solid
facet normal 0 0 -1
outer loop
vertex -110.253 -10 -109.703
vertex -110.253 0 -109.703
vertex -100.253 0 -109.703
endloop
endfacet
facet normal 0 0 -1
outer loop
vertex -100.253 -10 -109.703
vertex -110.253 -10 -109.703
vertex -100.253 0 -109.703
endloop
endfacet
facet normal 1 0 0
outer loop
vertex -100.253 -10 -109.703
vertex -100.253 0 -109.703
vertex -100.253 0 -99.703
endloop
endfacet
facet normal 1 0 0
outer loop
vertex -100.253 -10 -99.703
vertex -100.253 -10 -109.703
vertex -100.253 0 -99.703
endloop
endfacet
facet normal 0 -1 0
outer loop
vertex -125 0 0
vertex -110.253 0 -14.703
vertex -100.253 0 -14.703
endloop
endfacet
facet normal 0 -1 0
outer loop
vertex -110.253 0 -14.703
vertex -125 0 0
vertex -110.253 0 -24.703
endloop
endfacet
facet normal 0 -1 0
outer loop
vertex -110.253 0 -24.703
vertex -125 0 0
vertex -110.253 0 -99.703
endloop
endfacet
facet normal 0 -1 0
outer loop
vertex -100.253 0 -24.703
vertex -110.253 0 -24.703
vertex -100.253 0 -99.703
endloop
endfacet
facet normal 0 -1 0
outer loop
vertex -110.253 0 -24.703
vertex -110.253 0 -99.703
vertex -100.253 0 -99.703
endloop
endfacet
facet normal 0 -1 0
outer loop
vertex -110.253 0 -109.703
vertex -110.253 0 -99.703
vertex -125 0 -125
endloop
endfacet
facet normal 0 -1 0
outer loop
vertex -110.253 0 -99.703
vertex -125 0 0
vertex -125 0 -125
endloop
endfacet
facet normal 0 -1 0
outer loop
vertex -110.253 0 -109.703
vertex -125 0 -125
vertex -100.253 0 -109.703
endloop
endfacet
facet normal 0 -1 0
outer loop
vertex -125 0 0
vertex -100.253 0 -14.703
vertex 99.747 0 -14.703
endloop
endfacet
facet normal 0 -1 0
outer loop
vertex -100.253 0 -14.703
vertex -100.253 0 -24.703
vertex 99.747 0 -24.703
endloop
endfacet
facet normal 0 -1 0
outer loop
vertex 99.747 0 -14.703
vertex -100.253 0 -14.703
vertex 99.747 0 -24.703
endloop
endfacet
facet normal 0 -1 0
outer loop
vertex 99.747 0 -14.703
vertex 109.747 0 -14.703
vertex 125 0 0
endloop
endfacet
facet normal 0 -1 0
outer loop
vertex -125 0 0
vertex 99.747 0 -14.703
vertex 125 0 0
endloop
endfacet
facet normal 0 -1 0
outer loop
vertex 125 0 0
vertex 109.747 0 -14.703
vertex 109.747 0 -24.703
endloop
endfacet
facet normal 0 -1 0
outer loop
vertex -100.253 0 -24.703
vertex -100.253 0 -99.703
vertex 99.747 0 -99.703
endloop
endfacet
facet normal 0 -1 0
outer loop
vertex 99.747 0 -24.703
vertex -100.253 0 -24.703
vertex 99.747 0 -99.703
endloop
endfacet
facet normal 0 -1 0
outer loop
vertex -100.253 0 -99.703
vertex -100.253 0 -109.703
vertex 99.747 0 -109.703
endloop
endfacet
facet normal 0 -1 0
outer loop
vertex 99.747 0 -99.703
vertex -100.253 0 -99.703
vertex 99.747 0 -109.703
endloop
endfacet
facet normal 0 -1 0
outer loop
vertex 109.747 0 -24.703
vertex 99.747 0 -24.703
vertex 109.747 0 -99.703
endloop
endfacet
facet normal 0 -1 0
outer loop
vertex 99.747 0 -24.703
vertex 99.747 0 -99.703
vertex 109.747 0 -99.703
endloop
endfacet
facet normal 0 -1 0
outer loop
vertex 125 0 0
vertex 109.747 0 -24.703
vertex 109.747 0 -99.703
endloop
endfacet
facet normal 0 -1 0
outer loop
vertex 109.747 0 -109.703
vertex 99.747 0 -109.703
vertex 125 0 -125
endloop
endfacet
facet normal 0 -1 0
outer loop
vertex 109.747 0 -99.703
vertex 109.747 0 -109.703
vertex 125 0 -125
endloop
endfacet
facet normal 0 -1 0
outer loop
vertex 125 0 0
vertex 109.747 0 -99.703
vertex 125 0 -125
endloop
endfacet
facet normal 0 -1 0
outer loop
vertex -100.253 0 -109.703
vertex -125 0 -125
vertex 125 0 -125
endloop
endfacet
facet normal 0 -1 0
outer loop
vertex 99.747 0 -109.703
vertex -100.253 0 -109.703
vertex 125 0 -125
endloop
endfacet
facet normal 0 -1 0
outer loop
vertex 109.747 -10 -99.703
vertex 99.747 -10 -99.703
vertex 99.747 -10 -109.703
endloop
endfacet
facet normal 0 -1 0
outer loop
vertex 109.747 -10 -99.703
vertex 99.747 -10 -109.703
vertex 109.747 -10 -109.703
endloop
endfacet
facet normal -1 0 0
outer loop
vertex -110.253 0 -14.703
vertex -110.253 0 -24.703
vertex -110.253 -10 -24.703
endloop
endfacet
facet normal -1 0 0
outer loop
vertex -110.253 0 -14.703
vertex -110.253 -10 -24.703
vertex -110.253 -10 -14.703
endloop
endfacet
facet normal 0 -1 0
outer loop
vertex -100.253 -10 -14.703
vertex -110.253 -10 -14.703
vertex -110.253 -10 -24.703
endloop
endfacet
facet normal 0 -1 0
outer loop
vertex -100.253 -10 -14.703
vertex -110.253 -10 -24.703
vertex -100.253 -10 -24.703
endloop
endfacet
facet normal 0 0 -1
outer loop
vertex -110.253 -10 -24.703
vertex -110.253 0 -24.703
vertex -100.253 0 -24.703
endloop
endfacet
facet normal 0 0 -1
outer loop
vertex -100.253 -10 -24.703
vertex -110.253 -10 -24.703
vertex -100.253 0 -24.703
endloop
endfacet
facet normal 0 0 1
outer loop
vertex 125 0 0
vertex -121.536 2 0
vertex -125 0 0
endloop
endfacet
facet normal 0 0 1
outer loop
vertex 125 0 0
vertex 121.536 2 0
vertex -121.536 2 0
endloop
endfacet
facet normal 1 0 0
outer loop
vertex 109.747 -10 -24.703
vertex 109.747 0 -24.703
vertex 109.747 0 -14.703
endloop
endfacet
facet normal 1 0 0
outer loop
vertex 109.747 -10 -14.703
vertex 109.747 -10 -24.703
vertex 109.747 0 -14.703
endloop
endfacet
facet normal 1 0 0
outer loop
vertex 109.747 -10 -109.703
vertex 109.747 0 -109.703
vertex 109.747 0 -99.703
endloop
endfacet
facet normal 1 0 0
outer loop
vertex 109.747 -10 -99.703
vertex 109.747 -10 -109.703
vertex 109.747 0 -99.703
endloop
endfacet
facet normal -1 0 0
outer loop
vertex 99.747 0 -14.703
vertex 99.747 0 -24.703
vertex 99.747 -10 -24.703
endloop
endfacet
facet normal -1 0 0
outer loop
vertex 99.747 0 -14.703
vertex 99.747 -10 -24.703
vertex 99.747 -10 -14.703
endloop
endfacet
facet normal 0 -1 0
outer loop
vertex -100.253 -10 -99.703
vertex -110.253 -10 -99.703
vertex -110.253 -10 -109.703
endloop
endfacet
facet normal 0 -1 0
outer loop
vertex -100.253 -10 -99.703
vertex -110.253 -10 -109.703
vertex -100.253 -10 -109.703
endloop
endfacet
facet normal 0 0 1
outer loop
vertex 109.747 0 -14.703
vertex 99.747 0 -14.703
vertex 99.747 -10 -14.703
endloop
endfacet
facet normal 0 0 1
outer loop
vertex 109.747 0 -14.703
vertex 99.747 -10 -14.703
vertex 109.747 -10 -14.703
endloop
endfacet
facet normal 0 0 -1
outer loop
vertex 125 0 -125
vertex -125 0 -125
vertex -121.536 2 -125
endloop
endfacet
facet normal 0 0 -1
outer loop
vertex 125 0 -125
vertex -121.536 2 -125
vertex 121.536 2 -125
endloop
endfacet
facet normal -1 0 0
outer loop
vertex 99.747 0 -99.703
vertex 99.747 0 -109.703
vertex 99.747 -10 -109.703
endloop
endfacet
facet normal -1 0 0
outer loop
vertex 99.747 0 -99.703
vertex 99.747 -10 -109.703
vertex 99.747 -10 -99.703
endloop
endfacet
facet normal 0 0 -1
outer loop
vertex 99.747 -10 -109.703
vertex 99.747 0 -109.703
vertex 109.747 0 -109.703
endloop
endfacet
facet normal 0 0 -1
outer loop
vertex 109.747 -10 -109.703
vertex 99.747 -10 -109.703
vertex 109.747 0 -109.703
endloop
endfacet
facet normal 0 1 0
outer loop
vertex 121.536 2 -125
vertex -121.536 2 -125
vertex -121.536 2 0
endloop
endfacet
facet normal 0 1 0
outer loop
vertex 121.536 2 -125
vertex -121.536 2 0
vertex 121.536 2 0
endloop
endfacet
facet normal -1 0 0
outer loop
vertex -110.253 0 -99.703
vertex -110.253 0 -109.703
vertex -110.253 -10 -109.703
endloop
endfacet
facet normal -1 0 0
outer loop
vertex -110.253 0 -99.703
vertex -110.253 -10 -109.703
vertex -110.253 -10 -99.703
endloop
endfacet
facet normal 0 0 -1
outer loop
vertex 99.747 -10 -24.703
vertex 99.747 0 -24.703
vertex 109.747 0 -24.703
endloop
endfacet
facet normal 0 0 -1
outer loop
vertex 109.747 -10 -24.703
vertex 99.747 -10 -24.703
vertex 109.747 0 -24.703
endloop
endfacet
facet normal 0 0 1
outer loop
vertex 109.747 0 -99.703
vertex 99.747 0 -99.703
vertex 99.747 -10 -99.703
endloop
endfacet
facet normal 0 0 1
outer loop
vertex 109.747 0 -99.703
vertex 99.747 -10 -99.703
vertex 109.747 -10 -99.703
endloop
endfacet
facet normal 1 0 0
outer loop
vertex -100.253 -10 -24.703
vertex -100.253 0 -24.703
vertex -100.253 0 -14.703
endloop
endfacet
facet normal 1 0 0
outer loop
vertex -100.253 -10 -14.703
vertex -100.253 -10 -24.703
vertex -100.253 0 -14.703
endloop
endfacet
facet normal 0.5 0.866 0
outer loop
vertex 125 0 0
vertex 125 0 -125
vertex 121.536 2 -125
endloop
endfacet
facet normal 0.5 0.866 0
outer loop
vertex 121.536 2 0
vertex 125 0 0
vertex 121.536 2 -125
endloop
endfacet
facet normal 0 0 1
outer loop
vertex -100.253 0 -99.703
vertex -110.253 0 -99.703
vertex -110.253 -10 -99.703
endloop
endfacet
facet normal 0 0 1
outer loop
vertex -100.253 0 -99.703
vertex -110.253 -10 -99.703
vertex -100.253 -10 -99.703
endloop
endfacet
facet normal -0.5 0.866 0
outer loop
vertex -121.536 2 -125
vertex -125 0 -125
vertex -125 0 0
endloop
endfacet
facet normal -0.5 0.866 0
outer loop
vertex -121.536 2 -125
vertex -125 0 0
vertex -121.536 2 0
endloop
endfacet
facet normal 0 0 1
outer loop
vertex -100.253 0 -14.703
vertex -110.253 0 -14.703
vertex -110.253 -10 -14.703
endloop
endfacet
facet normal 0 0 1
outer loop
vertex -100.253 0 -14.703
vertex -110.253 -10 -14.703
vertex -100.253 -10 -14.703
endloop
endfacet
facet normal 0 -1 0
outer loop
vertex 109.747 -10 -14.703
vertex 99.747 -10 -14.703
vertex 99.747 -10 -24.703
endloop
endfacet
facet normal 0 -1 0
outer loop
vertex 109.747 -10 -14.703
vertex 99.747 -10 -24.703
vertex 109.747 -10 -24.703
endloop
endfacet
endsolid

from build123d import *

# Parameters (mm, degrees)
SKETCH_1_W          = 250
SKETCH_1_H          = 250
EXTRUDE_1_DEPTH     = 2
SKETCH_2_W          = 250
SKETCH_2_H          = 125
CUT_EXTRUDE_1_DEPTH = 2
SKETCH_6_W          = 10
SKETCH_6_H          = 10
EXTRUDE_3_DEPTH     = 10
CUT_EXTRUDE_2_DEPTH = 178.059312096


with BuildPart() as part:
    # 草图1 → 凸台-拉伸1 (new body)
    with BuildSketch(Plane(origin=(0, 0, 0), x_dir=(1, 0, 0), z_dir=(0, 1, 0))):
        Rectangle(SKETCH_1_W, SKETCH_1_H)
    extrude(amount=EXTRUDE_1_DEPTH)

    # 草图2 → 切除-拉伸1 (cut)
    with BuildSketch(Plane(origin=(0, 2, 0), x_dir=(1, 0, 0), z_dir=(0, 1, 0))):
        with Locations((0, -62.5)):
            Rectangle(SKETCH_2_W, SKETCH_2_H)
    extrude(amount=-CUT_EXTRUDE_1_DEPTH, mode=Mode.SUBTRACT)

    # 草图6 → 凸台-拉伸3 (add)
    with BuildSketch(Plane.XZ):
        with Locations((-105.253353702, -19.703268914)):
            Rectangle(SKETCH_6_W, SKETCH_6_H)
        with Locations((-105.253353702, -104.703268914)):
            Rectangle(SKETCH_6_W, SKETCH_6_H)
        with Locations((104.746646298, -19.703268914)):
            Rectangle(SKETCH_6_W, SKETCH_6_H)
        with Locations((104.746646298, -104.703268914)):
            Rectangle(SKETCH_6_W, SKETCH_6_H)
    extrude(amount=EXTRUDE_3_DEPTH)

    # 草图7 → 切除-拉伸2 (cut, through all)
    with BuildSketch(Plane(origin=(0, 0, -125), x_dir=(-1, 0, 0), z_dir=(0, 0, -1))):
        Polygon((-125, 2), (-125, 0), (-121.535898385, 2), align=None)
        Polygon((121.535898385, 2), (125, 2), (125, 0), align=None)
    extrude(amount=-CUT_EXTRUDE_2_DEPTH, mode=Mode.SUBTRACT)


solid = part.part
